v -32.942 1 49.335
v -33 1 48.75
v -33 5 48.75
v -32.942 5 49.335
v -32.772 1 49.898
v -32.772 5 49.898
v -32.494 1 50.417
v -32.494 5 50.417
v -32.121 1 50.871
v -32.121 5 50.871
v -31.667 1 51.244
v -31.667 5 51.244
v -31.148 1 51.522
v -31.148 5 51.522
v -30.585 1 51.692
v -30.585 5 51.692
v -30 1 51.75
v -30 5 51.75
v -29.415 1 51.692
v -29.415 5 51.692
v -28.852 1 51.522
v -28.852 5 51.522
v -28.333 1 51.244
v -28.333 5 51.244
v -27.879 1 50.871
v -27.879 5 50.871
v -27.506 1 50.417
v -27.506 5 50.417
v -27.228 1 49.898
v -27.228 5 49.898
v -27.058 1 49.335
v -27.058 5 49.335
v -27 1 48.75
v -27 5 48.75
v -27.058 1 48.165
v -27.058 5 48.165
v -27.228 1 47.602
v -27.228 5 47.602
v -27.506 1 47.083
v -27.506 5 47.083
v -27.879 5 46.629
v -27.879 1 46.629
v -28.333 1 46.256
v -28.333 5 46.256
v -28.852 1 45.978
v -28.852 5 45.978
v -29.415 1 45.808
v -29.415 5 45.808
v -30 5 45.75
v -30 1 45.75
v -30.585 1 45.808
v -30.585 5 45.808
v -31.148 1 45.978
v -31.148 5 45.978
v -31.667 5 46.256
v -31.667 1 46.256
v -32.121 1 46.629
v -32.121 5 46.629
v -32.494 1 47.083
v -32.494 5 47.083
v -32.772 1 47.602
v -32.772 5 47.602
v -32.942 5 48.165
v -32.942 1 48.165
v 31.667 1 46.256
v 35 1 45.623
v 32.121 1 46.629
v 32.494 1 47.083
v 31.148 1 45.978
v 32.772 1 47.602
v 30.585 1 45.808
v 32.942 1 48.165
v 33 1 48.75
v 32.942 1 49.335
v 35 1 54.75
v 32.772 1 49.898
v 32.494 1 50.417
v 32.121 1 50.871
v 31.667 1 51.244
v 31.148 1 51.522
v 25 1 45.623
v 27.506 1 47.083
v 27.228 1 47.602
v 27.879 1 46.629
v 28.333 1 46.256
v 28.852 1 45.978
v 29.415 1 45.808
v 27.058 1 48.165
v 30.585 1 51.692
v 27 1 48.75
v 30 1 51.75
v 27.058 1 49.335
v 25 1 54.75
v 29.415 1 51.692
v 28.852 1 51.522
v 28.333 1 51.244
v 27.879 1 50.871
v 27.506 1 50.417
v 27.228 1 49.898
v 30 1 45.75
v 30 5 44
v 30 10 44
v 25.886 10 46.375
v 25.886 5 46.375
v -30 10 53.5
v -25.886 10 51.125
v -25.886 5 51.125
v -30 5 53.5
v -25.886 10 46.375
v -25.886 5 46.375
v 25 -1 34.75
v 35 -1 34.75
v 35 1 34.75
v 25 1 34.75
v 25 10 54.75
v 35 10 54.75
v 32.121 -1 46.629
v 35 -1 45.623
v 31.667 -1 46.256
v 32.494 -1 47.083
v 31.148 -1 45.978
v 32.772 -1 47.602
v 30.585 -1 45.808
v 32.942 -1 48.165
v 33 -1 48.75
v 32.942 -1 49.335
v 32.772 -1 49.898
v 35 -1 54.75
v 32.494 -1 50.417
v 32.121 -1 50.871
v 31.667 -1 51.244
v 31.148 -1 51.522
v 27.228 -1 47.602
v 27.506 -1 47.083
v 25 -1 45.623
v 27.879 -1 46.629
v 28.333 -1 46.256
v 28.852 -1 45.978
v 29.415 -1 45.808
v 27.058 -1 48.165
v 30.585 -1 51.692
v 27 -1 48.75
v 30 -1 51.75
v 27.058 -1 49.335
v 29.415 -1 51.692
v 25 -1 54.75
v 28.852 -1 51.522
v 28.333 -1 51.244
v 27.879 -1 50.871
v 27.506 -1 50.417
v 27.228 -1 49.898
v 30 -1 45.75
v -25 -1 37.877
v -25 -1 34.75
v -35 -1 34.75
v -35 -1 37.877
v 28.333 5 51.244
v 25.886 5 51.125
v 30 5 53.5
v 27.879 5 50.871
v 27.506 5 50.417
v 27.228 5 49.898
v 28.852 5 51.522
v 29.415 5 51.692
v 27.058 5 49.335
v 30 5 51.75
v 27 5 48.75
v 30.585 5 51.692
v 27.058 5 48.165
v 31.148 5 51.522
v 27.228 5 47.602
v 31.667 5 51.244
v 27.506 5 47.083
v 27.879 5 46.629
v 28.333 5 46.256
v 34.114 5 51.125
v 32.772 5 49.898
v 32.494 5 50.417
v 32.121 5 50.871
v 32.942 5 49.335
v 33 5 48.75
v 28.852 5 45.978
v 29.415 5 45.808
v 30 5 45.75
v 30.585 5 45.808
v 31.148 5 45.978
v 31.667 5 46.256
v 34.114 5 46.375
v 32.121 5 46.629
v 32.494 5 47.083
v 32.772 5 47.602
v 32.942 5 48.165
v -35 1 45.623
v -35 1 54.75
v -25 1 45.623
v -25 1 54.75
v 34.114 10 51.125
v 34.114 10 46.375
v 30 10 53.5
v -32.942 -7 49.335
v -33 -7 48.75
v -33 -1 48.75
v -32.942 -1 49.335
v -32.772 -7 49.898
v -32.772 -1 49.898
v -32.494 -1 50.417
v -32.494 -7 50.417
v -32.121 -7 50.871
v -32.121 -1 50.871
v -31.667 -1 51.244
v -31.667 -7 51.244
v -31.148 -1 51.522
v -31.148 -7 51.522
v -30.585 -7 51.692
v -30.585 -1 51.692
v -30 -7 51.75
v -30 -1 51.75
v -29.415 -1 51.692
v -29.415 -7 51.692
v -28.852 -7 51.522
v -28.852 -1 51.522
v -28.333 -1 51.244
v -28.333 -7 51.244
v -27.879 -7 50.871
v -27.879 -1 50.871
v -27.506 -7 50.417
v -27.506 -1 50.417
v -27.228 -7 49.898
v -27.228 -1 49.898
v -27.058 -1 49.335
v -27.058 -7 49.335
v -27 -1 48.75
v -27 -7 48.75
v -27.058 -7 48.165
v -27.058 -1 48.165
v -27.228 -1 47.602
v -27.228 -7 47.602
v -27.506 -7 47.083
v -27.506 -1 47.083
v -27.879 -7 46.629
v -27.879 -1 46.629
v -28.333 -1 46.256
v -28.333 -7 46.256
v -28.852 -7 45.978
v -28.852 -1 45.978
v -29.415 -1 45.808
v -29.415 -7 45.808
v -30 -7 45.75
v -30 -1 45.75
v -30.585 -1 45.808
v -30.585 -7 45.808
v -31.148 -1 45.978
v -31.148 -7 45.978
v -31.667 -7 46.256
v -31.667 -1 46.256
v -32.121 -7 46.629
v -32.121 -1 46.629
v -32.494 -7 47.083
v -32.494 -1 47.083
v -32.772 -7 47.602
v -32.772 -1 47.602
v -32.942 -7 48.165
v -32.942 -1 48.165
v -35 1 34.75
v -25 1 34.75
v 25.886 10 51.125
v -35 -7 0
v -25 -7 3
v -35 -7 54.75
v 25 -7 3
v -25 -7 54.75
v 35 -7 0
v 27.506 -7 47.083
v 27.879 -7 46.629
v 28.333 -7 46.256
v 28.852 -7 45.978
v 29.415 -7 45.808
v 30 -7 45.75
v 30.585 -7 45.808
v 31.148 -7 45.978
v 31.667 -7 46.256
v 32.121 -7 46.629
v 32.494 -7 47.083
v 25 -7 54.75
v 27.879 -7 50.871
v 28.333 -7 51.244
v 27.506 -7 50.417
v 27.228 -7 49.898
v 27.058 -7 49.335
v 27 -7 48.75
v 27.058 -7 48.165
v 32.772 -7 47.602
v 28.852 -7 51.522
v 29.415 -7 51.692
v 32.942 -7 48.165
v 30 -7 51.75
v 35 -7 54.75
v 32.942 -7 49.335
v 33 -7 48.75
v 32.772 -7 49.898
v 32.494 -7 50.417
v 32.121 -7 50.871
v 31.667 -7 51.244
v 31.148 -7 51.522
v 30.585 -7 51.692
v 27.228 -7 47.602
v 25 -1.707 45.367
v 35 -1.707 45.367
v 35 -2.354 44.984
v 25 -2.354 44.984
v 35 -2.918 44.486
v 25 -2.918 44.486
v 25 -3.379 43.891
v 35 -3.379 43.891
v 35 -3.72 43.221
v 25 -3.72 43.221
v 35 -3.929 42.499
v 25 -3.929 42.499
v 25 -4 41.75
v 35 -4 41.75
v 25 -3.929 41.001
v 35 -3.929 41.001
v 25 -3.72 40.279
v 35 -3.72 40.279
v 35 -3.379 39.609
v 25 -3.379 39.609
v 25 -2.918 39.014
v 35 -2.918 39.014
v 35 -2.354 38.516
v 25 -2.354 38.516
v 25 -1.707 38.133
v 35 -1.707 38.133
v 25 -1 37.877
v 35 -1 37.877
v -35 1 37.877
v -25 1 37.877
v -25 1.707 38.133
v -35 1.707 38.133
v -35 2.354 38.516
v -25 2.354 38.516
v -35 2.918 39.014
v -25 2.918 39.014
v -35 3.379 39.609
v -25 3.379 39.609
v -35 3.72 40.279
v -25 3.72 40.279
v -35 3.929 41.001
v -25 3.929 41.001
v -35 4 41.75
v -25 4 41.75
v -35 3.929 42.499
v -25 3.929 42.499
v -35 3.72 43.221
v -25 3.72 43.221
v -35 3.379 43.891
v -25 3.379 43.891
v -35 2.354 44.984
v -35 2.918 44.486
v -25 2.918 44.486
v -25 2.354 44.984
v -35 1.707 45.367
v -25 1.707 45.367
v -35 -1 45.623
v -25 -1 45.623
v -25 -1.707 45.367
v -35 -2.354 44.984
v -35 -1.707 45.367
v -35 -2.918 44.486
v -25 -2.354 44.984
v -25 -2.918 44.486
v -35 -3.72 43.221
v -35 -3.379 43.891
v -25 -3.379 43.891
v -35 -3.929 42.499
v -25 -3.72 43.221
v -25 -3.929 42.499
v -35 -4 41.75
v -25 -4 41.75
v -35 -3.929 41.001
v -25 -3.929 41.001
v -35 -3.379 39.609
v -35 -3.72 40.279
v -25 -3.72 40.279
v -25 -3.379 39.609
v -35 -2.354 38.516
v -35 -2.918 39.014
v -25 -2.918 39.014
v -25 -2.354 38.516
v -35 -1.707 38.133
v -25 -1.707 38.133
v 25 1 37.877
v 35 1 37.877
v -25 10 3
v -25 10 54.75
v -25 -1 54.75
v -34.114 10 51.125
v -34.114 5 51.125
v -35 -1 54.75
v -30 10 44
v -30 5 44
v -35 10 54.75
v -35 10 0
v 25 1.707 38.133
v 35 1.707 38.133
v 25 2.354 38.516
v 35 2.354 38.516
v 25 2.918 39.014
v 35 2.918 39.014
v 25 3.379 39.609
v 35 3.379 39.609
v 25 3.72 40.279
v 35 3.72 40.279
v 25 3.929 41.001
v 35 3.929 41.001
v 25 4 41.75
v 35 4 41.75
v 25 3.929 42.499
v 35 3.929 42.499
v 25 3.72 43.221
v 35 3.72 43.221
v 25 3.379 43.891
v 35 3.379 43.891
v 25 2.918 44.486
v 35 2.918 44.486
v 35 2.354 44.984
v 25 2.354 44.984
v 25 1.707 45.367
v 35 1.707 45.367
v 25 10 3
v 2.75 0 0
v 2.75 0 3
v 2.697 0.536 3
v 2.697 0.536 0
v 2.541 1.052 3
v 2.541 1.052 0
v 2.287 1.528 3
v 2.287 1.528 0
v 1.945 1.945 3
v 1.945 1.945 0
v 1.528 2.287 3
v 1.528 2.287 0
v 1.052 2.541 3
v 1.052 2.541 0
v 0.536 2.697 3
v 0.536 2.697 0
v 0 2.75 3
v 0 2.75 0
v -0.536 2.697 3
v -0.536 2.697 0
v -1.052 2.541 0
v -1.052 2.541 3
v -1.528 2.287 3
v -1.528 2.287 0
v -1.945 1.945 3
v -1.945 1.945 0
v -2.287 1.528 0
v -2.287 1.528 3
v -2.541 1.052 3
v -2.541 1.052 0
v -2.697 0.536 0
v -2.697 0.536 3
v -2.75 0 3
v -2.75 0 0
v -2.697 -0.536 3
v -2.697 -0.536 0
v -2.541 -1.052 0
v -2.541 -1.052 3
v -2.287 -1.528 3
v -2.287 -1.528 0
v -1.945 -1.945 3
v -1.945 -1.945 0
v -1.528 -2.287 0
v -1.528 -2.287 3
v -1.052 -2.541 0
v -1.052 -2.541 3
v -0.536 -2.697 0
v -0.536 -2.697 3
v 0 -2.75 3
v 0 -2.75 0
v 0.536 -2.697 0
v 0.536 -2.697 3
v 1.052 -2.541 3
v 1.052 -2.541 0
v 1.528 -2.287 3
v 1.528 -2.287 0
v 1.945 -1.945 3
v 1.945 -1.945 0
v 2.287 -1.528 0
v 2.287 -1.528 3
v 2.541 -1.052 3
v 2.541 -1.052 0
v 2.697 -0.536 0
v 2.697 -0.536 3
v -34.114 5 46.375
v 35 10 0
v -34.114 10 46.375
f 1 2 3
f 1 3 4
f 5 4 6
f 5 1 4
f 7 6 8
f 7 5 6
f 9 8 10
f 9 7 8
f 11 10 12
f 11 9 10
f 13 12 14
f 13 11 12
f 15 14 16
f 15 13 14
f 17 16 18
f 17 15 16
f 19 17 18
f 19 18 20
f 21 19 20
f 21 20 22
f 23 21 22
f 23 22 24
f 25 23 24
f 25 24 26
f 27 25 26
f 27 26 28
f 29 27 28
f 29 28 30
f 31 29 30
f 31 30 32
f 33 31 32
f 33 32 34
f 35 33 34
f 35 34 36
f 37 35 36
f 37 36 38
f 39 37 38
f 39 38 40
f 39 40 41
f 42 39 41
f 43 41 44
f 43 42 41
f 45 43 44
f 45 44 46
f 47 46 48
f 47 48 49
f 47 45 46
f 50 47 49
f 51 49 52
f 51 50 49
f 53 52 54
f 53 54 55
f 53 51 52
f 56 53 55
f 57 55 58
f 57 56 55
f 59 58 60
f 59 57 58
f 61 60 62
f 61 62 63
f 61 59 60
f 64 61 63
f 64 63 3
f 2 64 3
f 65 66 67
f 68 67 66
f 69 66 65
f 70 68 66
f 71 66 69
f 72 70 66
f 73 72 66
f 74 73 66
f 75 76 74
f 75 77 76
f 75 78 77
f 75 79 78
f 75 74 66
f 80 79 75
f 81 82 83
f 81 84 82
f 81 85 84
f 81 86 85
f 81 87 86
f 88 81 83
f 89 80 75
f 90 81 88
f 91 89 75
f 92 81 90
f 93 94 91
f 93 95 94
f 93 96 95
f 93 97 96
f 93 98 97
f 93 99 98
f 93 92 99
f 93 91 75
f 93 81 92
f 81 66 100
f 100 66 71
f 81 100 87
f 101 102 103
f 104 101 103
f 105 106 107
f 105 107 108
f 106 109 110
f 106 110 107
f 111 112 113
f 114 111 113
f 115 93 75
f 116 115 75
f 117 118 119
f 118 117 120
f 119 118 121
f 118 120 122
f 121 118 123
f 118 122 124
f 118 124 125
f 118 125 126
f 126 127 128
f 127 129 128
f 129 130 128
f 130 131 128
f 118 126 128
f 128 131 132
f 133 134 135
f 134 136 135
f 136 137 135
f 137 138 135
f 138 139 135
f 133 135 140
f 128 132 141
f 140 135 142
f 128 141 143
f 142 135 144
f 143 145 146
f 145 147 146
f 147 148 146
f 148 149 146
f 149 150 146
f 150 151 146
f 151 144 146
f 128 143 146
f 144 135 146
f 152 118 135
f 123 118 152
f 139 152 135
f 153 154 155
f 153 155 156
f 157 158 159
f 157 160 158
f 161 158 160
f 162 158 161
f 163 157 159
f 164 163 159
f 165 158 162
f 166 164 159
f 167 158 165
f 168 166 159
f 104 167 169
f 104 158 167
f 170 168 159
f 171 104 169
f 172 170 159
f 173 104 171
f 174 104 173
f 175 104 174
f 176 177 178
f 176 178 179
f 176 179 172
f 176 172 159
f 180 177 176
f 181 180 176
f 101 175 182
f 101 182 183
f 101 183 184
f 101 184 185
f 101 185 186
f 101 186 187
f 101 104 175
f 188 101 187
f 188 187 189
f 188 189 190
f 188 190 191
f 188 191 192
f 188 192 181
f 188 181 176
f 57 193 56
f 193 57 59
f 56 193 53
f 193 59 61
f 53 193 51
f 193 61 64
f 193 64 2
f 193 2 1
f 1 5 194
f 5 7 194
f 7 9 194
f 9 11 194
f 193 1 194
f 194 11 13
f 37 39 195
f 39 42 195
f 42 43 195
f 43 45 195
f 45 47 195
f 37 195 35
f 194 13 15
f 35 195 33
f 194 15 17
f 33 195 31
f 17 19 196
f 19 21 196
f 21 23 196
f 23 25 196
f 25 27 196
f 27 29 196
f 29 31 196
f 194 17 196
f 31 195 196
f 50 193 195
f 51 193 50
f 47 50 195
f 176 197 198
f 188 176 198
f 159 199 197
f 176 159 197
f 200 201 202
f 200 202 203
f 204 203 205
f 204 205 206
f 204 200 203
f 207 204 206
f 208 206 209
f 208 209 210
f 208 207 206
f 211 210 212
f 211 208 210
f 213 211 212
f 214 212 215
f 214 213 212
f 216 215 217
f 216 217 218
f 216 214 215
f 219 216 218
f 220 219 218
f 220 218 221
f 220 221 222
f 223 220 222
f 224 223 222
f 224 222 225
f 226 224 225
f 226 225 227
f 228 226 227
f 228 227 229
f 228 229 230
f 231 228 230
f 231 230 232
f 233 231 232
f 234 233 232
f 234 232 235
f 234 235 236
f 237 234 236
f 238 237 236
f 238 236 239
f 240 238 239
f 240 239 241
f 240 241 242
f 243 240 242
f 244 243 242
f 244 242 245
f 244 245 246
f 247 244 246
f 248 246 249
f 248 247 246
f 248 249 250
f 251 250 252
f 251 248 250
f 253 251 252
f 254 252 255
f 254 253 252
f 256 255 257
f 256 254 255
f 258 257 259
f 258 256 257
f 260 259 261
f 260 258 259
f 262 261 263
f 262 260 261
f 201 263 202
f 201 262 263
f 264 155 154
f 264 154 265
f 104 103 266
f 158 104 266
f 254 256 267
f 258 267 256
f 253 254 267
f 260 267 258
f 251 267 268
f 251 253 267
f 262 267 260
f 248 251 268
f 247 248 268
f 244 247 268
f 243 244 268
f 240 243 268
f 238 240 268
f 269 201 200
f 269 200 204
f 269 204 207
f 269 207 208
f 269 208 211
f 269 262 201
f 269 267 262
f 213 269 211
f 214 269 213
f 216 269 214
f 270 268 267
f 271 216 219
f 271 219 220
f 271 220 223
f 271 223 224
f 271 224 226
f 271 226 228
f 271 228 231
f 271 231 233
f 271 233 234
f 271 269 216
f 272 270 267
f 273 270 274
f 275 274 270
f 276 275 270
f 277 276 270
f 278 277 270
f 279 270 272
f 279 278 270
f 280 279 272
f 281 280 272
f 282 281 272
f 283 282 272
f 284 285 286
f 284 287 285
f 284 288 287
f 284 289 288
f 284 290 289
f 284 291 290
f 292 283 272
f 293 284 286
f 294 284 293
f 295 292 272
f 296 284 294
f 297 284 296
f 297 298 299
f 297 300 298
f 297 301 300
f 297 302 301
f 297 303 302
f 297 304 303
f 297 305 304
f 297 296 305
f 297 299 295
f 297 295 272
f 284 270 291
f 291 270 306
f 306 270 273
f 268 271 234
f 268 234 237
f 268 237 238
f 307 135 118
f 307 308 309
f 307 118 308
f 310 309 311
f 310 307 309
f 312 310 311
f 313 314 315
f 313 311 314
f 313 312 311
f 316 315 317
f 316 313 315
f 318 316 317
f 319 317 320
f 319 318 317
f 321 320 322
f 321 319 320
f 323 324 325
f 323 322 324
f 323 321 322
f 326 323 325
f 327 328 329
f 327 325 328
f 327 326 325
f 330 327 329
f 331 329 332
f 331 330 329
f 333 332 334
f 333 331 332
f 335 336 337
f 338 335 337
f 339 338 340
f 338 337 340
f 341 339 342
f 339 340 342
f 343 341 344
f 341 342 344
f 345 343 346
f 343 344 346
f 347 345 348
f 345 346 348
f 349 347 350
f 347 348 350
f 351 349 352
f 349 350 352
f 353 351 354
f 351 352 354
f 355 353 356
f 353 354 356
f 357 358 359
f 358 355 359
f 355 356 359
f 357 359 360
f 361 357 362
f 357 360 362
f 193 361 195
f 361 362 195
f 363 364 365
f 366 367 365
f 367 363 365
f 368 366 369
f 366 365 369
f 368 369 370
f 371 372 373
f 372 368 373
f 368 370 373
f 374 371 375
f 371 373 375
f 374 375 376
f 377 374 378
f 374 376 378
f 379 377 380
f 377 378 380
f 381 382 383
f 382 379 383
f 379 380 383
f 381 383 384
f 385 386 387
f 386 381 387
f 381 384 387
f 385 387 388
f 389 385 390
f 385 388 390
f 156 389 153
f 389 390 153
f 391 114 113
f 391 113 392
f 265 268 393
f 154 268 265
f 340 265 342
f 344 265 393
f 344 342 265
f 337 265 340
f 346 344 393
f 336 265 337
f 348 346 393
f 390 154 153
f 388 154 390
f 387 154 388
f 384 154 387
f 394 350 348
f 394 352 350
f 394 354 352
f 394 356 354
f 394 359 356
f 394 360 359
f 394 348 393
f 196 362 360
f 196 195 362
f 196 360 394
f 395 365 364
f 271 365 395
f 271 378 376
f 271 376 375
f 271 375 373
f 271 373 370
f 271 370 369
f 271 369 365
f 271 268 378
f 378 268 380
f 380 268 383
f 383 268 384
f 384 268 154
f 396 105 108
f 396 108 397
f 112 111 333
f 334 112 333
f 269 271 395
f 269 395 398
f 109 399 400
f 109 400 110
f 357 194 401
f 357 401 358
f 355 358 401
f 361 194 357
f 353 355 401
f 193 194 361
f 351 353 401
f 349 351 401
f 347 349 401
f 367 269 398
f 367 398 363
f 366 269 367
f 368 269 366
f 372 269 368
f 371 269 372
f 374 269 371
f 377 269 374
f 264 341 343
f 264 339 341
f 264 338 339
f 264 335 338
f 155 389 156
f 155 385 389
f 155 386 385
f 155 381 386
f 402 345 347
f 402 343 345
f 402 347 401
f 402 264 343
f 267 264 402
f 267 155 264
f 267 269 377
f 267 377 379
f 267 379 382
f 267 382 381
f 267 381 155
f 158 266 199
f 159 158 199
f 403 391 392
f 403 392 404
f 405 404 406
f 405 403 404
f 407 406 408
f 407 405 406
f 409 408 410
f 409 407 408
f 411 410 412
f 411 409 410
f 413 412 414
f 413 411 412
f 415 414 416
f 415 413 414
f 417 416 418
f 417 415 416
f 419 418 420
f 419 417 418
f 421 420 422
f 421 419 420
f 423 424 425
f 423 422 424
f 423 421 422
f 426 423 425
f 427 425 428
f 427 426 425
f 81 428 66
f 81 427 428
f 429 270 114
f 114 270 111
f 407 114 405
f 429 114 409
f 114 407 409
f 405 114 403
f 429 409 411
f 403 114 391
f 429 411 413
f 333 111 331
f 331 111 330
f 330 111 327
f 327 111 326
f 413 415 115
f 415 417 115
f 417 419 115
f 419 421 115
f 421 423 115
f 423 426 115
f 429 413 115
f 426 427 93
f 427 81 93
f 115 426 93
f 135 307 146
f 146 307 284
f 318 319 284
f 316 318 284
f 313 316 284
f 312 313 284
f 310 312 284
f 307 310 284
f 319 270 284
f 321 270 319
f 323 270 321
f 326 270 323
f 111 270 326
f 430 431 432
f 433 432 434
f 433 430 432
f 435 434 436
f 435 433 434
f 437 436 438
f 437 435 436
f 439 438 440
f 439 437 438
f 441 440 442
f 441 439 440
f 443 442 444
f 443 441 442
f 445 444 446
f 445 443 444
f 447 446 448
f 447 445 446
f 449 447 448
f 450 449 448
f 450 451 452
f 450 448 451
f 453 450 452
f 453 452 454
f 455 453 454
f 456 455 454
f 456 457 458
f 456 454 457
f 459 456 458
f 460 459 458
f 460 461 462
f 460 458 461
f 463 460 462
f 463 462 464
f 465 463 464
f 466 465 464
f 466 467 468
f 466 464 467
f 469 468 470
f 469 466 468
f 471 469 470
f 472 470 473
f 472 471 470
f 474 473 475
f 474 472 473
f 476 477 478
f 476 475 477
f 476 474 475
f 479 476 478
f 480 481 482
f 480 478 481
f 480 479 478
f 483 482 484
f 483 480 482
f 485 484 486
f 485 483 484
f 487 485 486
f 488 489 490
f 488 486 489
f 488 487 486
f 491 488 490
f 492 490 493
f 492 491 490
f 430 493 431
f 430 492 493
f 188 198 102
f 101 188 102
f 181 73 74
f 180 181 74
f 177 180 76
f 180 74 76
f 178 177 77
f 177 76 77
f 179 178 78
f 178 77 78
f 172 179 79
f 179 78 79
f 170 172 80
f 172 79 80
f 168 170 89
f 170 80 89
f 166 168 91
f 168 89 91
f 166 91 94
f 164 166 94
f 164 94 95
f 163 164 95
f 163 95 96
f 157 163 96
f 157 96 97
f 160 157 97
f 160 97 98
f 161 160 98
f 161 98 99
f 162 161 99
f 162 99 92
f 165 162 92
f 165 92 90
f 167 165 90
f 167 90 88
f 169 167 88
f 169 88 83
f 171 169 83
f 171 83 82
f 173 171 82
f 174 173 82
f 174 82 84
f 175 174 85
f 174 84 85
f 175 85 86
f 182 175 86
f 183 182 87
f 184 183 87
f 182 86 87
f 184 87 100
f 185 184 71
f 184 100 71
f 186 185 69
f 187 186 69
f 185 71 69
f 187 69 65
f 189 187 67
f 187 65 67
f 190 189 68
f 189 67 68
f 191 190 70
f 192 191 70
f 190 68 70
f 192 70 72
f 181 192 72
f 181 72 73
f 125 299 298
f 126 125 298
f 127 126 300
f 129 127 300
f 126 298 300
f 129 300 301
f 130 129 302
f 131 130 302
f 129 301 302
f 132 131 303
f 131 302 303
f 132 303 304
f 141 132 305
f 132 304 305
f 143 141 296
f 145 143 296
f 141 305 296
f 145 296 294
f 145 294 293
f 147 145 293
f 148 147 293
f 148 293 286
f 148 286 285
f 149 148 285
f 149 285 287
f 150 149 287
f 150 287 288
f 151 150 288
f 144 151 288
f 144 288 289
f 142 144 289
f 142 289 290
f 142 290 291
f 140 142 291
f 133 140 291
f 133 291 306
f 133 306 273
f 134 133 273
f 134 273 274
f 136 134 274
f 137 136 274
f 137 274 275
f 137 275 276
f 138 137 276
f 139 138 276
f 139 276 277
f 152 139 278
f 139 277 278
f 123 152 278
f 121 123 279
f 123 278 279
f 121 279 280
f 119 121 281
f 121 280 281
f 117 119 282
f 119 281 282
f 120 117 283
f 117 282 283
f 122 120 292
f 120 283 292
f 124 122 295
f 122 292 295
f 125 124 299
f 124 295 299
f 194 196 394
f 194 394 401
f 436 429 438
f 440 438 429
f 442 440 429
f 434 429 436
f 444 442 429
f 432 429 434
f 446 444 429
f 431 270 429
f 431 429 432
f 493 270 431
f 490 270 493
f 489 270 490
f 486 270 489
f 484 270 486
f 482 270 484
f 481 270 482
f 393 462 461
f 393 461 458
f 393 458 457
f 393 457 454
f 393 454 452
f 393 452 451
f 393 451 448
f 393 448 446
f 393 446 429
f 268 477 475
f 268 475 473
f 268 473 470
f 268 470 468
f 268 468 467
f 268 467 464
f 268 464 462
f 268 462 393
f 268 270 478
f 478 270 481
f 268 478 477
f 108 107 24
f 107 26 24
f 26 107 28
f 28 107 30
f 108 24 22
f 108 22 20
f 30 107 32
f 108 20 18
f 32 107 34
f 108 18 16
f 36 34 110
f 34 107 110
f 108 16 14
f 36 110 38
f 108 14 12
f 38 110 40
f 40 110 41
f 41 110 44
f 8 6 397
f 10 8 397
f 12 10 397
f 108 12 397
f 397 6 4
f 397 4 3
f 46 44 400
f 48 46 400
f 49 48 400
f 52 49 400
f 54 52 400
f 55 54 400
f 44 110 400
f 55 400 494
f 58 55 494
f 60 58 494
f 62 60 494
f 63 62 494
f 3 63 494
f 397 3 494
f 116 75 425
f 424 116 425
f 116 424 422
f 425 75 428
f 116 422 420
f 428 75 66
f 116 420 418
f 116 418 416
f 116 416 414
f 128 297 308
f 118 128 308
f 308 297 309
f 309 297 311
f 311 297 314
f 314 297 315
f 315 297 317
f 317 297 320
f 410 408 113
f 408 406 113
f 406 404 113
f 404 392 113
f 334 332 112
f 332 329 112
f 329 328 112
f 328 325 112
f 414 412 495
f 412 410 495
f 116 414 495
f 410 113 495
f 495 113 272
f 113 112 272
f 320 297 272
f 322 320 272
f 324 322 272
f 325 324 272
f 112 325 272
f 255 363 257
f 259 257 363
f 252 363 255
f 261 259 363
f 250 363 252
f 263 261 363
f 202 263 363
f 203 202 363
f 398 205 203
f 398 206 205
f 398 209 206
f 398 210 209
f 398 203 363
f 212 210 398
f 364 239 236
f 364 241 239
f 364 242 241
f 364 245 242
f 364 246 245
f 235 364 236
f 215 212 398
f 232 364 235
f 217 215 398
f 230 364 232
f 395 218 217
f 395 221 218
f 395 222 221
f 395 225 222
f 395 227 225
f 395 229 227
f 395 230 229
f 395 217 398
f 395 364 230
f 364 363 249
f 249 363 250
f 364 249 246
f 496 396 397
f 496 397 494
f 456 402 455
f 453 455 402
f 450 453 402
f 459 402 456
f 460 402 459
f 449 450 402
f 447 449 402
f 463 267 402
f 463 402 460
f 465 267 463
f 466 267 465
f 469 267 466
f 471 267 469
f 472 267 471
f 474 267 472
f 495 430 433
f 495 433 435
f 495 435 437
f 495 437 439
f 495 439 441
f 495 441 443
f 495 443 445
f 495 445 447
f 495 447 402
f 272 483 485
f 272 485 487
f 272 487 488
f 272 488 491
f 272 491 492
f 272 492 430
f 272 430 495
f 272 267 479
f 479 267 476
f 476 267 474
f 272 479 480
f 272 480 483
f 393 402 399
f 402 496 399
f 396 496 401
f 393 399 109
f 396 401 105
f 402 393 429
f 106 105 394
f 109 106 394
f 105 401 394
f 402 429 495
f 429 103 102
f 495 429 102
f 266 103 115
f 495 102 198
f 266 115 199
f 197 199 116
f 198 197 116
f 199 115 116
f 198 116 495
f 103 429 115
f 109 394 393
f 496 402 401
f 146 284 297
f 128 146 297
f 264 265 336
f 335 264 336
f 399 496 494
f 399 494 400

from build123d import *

# Parameters (mm, degrees)
PAD_DEPTH       = 7
PAD_DEPTH_BACK  = 10
SKETCH003_R     = 4
POCKET_DEPTH    = 35.001
SKETCH004_R     = 3
POCKET001_DEPTH = 17.001
POCKET003_DEPTH = 5
SKETCH007_W     = 2
SKETCH007_H     = 20
POCKET004_DEPTH = 35.001
SKETCH008_R     = 2.75
POCKET005_DEPTH = 54.751


with BuildPart() as part:
    # Sketch → Pad (new body, two sides)
    with BuildSketch(Plane.XZ) as pad_sk:
        Polygon((0, 0), (0, 3), (25, 3), (25, 54.75), (35, 54.75), (35, 0), align=None)
    extrude(amount=PAD_DEPTH)
    extrude(pad_sk.sketch, amount=-PAD_DEPTH_BACK)

    # Sketch003 → Pocket (cut, through all)
    with BuildSketch(Plane.YZ):
        with Locations((0, 41.75)):
            Circle(SKETCH003_R)
    extrude(amount=POCKET_DEPTH, mode=Mode.SUBTRACT)

    # Sketch004 (on Face5 of Pocket) → Pocket001 (cut, through all)
    with BuildSketch(Plane.XZ.offset(7)):
        with Locations((30, 48.75)):
            Circle(SKETCH004_R)
    extrude(amount=-POCKET001_DEPTH, mode=Mode.SUBTRACT)

    # Sketch006 → Pocket003 (cut)
    with BuildSketch(Plane(origin=(0, 10, 0), x_dir=(1, 0, 0), z_dir=(0, 1, 0))):
        Polygon((30, -44), (25.886379, -46.375), (25.886379, -51.125), (30, -53.5), (34.113621, -51.125), (34.113621, -46.375), align=None)
    extrude(amount=-POCKET003_DEPTH, mode=Mode.SUBTRACT)

    # Sketch007 → Pocket004 (cut, through all)
    with BuildSketch(Plane.YZ):
        with Locations((0, 44.75)):
            Rectangle(SKETCH007_W, SKETCH007_H)
    extrude(amount=POCKET004_DEPTH, mode=Mode.SUBTRACT)

    # Mirrored: part across YZ


with BuildPart() as part_1:
    add(part.part)
    add(part.part.mirror(Plane.YZ))

    # Sketch008 → Pocket005 (cut, through all)
    with BuildSketch(Plane.XY):
        Circle(SKETCH008_R)
    extrude(amount=POCKET005_DEPTH, mode=Mode.SUBTRACT)


solid = part_1.part
